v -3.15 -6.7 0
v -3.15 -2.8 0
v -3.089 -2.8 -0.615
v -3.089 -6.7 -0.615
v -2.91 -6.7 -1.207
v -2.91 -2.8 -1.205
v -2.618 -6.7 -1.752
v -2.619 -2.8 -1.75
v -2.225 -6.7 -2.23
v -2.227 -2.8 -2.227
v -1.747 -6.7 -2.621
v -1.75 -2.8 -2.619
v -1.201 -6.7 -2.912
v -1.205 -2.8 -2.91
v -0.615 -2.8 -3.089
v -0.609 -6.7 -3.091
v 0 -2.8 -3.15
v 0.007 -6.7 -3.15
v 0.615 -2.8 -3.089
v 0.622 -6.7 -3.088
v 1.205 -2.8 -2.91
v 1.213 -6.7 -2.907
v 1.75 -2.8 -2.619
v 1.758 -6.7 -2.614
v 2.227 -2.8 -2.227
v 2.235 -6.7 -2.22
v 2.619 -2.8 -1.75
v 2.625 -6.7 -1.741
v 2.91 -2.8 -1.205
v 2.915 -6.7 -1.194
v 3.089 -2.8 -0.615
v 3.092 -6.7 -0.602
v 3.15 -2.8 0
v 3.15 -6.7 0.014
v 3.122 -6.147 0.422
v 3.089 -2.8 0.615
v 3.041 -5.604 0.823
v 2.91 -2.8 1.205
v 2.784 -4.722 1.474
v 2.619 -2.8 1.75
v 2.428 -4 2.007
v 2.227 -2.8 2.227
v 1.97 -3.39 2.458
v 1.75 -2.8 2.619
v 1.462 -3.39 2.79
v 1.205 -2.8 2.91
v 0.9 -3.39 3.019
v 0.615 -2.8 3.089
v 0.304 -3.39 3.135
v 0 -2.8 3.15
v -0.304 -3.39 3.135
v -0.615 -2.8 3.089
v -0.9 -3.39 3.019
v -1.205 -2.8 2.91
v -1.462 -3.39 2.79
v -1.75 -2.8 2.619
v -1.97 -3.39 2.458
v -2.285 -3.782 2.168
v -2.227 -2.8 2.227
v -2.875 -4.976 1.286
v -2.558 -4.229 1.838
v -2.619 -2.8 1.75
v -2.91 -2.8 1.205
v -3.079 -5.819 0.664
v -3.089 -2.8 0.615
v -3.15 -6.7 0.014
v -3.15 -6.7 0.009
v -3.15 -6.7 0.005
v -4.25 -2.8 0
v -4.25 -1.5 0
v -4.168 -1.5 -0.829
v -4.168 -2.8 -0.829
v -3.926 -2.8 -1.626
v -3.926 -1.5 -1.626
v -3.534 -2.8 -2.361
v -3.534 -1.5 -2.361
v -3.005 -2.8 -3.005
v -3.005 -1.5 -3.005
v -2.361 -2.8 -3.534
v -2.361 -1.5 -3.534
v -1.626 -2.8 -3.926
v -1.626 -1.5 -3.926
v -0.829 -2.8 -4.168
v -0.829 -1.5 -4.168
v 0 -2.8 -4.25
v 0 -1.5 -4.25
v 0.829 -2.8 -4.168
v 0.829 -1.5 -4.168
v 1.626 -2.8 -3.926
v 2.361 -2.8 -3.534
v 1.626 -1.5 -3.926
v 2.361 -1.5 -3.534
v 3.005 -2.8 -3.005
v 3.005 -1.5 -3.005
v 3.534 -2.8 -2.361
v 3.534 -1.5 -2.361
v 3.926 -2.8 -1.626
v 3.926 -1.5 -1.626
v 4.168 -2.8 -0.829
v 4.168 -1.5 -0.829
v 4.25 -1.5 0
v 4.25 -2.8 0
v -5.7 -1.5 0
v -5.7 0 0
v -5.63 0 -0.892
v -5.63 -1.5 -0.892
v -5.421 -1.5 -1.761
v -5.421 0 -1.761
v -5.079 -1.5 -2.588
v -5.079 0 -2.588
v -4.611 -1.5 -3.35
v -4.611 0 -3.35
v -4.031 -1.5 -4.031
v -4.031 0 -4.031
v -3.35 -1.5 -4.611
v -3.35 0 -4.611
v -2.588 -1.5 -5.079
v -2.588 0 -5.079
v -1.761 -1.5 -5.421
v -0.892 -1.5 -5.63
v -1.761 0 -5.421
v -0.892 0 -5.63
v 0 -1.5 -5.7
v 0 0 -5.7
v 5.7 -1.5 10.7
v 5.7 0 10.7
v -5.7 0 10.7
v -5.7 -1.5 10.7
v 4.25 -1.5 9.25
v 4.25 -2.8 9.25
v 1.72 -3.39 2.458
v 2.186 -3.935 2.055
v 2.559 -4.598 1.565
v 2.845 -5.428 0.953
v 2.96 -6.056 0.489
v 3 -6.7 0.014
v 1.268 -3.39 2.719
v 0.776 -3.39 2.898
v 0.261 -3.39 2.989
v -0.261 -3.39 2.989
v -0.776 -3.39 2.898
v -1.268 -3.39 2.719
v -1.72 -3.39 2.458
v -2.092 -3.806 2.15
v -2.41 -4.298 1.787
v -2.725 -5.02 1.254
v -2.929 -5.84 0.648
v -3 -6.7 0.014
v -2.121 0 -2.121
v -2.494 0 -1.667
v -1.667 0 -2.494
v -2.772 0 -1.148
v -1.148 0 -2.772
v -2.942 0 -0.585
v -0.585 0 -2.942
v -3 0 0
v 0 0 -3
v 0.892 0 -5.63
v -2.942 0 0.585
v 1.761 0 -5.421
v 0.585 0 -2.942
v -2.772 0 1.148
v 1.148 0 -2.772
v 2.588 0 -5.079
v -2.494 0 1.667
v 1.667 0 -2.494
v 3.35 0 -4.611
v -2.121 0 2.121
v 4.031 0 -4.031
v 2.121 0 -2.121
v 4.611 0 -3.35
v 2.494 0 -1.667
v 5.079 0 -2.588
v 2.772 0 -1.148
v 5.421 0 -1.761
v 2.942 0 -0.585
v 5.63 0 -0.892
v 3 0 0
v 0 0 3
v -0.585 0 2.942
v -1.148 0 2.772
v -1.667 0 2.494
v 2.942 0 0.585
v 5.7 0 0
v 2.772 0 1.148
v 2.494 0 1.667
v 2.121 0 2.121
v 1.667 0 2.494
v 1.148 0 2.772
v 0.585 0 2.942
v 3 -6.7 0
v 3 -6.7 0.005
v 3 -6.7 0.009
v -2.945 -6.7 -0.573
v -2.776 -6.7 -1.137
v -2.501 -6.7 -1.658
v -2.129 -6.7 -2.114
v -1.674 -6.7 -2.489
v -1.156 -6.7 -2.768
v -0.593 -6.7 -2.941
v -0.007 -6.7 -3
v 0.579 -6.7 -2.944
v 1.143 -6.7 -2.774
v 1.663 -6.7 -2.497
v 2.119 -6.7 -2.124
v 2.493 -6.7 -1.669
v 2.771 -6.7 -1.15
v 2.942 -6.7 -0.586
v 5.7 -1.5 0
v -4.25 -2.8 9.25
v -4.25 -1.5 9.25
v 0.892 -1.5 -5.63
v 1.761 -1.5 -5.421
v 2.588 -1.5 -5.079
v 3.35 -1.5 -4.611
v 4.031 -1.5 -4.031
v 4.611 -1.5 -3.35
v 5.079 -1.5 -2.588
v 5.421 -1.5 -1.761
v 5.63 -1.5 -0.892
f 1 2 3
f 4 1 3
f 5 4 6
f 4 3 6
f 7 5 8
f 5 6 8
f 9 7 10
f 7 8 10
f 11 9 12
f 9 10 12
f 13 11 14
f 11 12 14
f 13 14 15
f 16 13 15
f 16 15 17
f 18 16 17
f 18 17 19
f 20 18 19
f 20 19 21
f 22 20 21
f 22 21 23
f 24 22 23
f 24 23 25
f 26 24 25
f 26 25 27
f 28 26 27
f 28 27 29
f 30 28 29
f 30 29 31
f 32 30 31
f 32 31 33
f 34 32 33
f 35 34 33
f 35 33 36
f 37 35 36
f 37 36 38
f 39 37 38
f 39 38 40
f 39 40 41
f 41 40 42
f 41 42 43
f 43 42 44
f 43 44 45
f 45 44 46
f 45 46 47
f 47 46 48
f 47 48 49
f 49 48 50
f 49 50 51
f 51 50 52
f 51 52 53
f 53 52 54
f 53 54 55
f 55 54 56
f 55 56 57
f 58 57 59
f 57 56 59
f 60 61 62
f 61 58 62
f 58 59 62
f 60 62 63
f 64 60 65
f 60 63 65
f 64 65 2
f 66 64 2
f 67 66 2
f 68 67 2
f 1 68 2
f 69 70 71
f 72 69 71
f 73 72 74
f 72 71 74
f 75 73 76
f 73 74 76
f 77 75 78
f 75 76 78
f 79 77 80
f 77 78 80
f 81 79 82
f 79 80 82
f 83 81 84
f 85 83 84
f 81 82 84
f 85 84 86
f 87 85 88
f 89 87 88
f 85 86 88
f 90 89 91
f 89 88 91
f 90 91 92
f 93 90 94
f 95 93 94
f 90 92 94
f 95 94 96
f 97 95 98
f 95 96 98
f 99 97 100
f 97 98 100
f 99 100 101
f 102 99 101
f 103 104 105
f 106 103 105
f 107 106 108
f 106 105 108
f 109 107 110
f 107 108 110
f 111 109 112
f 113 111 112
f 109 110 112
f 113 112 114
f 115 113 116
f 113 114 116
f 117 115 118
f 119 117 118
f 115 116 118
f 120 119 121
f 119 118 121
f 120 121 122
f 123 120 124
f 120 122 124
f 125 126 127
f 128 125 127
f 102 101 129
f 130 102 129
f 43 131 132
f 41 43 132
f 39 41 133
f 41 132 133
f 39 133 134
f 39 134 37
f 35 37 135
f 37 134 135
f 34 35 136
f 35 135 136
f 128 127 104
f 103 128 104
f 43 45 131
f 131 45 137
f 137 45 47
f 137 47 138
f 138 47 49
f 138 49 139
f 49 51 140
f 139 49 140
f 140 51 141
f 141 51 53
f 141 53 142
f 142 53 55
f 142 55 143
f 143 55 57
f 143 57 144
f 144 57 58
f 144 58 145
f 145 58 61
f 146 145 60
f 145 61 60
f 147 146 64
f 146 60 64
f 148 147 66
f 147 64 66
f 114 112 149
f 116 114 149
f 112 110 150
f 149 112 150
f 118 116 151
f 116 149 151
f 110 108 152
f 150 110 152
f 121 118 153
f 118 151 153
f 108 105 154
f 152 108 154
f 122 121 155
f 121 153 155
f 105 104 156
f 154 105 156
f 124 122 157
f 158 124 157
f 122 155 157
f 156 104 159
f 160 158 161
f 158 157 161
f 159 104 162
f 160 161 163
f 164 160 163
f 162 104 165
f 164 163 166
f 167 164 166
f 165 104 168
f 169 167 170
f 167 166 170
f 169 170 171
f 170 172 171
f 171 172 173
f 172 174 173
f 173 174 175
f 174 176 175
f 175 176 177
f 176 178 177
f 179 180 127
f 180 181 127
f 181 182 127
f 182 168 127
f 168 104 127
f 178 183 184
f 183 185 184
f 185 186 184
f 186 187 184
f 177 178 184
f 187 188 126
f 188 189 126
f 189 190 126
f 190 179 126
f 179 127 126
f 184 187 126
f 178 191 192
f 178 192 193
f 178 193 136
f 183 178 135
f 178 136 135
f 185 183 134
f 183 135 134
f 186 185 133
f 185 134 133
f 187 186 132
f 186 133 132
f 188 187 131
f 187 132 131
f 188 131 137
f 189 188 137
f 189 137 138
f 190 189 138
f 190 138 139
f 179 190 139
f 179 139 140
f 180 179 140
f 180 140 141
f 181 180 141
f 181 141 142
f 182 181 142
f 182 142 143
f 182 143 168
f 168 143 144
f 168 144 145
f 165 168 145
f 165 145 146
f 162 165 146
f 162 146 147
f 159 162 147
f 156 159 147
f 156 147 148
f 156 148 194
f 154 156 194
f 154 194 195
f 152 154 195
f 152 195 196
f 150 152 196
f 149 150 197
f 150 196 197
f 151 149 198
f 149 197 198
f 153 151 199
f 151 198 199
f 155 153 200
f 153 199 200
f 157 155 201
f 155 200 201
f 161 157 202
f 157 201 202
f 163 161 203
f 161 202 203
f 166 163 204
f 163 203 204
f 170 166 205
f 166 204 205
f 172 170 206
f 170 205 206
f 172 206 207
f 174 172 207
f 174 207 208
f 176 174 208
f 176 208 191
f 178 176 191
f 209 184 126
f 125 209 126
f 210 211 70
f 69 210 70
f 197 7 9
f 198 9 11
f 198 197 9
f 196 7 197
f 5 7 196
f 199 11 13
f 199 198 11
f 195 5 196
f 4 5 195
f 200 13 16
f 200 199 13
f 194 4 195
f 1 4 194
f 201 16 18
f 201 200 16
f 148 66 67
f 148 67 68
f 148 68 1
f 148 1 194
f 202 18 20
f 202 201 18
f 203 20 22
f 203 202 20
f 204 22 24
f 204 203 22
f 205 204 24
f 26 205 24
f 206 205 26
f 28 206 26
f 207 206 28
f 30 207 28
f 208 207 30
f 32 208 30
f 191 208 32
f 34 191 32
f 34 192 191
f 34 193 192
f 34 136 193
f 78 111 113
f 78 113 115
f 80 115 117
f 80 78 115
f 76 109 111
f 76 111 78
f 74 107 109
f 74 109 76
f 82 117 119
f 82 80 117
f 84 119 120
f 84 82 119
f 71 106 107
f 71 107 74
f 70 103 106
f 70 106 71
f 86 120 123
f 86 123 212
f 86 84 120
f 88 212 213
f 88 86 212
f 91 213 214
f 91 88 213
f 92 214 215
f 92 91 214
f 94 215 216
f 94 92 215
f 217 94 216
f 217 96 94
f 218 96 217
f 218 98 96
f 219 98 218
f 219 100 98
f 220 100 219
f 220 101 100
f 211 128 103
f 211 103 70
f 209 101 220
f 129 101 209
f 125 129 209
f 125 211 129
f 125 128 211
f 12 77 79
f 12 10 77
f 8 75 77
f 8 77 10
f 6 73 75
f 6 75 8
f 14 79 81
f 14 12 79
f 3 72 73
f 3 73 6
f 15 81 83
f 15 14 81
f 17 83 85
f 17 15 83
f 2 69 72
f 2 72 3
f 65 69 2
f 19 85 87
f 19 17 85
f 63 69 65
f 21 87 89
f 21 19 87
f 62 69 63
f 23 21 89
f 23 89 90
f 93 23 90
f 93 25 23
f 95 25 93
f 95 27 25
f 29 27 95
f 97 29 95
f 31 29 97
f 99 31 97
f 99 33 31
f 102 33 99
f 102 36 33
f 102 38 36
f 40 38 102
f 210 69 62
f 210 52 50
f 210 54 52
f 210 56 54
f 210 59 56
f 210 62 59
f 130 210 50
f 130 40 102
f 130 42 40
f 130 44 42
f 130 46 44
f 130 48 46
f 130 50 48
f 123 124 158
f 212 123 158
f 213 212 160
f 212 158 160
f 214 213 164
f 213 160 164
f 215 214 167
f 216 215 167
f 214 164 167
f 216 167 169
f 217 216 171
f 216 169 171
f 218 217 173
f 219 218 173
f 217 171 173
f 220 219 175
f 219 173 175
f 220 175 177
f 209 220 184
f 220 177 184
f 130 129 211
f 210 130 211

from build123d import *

# Parameters (mm, degrees)
F1_DEPTH = 1.5
F3_DEPTH = 1.3
F5_DEPTH = 3.9
F6_R     = 3
F7_DEPTH = 6.701
F9_DEPTH = 25


with BuildPart() as f1:
    # F0 (on Front) → F1 (new body)
    with BuildSketch(Plane.XZ):
        with BuildLine():
            Line((-5.7, 10.7), (-5.7, 0))
            ThreePointArc((-5.7, 0), (-4.030509, -4.030509), (0, -5.7))
            ThreePointArc((0, -5.7), (4.030509, -4.030509), (5.7, 0))
            Line((5.7, 0), (5.7, 10.7))
            Line((5.7, 10.7), (-5.7, 10.7))
        make_face()
    extrude(amount=F1_DEPTH)

    # F2 (on face) → F3 (join)
    with BuildSketch(Plane.XZ.offset(1.5)):
        with BuildLine():
            Line((4.25, 0), (4.25, 9.25))
            Line((4.25, 9.25), (-4.25, 9.25))
            Line((-4.25, 9.25), (-4.25, 0))
            ThreePointArc((-4.25, 0), (0, -4.25), (4.25, 0))
        make_face()
    extrude(amount=F3_DEPTH)

    # F4 (on face) → F5 (join)
    with BuildSketch(Plane.XZ.offset(2.8)):
        with BuildLine():
            ThreePointArc((3.15, 0), (0, 3.15), (-3.15, 0))
            ThreePointArc((-3.15, 0), (0, -3.15), (3.15, 0))
        make_face()
    extrude(amount=F5_DEPTH)

    # F6 (on face) → F7 (cut, through all)
    with BuildSketch(Plane.XZ.offset(6.7)):
        Circle(F6_R)
    extrude(amount=-F7_DEPTH, mode=Mode.SUBTRACT)

    # F8 (on face) → F9 (cut)
    with BuildSketch(Plane(origin=(-4.25, 0, 0), x_dir=(0, -1, 0), z_dir=(-1, 0, 0))):
        Polygon((3.389618, 4.891665), (3.389618, 2.457727), (6.718387, 0), (7.86377, 0), (7.899563, 4.891665), align=None)
    extrude(amount=-F9_DEPTH, mode=Mode.SUBTRACT)


solid = f1.part
